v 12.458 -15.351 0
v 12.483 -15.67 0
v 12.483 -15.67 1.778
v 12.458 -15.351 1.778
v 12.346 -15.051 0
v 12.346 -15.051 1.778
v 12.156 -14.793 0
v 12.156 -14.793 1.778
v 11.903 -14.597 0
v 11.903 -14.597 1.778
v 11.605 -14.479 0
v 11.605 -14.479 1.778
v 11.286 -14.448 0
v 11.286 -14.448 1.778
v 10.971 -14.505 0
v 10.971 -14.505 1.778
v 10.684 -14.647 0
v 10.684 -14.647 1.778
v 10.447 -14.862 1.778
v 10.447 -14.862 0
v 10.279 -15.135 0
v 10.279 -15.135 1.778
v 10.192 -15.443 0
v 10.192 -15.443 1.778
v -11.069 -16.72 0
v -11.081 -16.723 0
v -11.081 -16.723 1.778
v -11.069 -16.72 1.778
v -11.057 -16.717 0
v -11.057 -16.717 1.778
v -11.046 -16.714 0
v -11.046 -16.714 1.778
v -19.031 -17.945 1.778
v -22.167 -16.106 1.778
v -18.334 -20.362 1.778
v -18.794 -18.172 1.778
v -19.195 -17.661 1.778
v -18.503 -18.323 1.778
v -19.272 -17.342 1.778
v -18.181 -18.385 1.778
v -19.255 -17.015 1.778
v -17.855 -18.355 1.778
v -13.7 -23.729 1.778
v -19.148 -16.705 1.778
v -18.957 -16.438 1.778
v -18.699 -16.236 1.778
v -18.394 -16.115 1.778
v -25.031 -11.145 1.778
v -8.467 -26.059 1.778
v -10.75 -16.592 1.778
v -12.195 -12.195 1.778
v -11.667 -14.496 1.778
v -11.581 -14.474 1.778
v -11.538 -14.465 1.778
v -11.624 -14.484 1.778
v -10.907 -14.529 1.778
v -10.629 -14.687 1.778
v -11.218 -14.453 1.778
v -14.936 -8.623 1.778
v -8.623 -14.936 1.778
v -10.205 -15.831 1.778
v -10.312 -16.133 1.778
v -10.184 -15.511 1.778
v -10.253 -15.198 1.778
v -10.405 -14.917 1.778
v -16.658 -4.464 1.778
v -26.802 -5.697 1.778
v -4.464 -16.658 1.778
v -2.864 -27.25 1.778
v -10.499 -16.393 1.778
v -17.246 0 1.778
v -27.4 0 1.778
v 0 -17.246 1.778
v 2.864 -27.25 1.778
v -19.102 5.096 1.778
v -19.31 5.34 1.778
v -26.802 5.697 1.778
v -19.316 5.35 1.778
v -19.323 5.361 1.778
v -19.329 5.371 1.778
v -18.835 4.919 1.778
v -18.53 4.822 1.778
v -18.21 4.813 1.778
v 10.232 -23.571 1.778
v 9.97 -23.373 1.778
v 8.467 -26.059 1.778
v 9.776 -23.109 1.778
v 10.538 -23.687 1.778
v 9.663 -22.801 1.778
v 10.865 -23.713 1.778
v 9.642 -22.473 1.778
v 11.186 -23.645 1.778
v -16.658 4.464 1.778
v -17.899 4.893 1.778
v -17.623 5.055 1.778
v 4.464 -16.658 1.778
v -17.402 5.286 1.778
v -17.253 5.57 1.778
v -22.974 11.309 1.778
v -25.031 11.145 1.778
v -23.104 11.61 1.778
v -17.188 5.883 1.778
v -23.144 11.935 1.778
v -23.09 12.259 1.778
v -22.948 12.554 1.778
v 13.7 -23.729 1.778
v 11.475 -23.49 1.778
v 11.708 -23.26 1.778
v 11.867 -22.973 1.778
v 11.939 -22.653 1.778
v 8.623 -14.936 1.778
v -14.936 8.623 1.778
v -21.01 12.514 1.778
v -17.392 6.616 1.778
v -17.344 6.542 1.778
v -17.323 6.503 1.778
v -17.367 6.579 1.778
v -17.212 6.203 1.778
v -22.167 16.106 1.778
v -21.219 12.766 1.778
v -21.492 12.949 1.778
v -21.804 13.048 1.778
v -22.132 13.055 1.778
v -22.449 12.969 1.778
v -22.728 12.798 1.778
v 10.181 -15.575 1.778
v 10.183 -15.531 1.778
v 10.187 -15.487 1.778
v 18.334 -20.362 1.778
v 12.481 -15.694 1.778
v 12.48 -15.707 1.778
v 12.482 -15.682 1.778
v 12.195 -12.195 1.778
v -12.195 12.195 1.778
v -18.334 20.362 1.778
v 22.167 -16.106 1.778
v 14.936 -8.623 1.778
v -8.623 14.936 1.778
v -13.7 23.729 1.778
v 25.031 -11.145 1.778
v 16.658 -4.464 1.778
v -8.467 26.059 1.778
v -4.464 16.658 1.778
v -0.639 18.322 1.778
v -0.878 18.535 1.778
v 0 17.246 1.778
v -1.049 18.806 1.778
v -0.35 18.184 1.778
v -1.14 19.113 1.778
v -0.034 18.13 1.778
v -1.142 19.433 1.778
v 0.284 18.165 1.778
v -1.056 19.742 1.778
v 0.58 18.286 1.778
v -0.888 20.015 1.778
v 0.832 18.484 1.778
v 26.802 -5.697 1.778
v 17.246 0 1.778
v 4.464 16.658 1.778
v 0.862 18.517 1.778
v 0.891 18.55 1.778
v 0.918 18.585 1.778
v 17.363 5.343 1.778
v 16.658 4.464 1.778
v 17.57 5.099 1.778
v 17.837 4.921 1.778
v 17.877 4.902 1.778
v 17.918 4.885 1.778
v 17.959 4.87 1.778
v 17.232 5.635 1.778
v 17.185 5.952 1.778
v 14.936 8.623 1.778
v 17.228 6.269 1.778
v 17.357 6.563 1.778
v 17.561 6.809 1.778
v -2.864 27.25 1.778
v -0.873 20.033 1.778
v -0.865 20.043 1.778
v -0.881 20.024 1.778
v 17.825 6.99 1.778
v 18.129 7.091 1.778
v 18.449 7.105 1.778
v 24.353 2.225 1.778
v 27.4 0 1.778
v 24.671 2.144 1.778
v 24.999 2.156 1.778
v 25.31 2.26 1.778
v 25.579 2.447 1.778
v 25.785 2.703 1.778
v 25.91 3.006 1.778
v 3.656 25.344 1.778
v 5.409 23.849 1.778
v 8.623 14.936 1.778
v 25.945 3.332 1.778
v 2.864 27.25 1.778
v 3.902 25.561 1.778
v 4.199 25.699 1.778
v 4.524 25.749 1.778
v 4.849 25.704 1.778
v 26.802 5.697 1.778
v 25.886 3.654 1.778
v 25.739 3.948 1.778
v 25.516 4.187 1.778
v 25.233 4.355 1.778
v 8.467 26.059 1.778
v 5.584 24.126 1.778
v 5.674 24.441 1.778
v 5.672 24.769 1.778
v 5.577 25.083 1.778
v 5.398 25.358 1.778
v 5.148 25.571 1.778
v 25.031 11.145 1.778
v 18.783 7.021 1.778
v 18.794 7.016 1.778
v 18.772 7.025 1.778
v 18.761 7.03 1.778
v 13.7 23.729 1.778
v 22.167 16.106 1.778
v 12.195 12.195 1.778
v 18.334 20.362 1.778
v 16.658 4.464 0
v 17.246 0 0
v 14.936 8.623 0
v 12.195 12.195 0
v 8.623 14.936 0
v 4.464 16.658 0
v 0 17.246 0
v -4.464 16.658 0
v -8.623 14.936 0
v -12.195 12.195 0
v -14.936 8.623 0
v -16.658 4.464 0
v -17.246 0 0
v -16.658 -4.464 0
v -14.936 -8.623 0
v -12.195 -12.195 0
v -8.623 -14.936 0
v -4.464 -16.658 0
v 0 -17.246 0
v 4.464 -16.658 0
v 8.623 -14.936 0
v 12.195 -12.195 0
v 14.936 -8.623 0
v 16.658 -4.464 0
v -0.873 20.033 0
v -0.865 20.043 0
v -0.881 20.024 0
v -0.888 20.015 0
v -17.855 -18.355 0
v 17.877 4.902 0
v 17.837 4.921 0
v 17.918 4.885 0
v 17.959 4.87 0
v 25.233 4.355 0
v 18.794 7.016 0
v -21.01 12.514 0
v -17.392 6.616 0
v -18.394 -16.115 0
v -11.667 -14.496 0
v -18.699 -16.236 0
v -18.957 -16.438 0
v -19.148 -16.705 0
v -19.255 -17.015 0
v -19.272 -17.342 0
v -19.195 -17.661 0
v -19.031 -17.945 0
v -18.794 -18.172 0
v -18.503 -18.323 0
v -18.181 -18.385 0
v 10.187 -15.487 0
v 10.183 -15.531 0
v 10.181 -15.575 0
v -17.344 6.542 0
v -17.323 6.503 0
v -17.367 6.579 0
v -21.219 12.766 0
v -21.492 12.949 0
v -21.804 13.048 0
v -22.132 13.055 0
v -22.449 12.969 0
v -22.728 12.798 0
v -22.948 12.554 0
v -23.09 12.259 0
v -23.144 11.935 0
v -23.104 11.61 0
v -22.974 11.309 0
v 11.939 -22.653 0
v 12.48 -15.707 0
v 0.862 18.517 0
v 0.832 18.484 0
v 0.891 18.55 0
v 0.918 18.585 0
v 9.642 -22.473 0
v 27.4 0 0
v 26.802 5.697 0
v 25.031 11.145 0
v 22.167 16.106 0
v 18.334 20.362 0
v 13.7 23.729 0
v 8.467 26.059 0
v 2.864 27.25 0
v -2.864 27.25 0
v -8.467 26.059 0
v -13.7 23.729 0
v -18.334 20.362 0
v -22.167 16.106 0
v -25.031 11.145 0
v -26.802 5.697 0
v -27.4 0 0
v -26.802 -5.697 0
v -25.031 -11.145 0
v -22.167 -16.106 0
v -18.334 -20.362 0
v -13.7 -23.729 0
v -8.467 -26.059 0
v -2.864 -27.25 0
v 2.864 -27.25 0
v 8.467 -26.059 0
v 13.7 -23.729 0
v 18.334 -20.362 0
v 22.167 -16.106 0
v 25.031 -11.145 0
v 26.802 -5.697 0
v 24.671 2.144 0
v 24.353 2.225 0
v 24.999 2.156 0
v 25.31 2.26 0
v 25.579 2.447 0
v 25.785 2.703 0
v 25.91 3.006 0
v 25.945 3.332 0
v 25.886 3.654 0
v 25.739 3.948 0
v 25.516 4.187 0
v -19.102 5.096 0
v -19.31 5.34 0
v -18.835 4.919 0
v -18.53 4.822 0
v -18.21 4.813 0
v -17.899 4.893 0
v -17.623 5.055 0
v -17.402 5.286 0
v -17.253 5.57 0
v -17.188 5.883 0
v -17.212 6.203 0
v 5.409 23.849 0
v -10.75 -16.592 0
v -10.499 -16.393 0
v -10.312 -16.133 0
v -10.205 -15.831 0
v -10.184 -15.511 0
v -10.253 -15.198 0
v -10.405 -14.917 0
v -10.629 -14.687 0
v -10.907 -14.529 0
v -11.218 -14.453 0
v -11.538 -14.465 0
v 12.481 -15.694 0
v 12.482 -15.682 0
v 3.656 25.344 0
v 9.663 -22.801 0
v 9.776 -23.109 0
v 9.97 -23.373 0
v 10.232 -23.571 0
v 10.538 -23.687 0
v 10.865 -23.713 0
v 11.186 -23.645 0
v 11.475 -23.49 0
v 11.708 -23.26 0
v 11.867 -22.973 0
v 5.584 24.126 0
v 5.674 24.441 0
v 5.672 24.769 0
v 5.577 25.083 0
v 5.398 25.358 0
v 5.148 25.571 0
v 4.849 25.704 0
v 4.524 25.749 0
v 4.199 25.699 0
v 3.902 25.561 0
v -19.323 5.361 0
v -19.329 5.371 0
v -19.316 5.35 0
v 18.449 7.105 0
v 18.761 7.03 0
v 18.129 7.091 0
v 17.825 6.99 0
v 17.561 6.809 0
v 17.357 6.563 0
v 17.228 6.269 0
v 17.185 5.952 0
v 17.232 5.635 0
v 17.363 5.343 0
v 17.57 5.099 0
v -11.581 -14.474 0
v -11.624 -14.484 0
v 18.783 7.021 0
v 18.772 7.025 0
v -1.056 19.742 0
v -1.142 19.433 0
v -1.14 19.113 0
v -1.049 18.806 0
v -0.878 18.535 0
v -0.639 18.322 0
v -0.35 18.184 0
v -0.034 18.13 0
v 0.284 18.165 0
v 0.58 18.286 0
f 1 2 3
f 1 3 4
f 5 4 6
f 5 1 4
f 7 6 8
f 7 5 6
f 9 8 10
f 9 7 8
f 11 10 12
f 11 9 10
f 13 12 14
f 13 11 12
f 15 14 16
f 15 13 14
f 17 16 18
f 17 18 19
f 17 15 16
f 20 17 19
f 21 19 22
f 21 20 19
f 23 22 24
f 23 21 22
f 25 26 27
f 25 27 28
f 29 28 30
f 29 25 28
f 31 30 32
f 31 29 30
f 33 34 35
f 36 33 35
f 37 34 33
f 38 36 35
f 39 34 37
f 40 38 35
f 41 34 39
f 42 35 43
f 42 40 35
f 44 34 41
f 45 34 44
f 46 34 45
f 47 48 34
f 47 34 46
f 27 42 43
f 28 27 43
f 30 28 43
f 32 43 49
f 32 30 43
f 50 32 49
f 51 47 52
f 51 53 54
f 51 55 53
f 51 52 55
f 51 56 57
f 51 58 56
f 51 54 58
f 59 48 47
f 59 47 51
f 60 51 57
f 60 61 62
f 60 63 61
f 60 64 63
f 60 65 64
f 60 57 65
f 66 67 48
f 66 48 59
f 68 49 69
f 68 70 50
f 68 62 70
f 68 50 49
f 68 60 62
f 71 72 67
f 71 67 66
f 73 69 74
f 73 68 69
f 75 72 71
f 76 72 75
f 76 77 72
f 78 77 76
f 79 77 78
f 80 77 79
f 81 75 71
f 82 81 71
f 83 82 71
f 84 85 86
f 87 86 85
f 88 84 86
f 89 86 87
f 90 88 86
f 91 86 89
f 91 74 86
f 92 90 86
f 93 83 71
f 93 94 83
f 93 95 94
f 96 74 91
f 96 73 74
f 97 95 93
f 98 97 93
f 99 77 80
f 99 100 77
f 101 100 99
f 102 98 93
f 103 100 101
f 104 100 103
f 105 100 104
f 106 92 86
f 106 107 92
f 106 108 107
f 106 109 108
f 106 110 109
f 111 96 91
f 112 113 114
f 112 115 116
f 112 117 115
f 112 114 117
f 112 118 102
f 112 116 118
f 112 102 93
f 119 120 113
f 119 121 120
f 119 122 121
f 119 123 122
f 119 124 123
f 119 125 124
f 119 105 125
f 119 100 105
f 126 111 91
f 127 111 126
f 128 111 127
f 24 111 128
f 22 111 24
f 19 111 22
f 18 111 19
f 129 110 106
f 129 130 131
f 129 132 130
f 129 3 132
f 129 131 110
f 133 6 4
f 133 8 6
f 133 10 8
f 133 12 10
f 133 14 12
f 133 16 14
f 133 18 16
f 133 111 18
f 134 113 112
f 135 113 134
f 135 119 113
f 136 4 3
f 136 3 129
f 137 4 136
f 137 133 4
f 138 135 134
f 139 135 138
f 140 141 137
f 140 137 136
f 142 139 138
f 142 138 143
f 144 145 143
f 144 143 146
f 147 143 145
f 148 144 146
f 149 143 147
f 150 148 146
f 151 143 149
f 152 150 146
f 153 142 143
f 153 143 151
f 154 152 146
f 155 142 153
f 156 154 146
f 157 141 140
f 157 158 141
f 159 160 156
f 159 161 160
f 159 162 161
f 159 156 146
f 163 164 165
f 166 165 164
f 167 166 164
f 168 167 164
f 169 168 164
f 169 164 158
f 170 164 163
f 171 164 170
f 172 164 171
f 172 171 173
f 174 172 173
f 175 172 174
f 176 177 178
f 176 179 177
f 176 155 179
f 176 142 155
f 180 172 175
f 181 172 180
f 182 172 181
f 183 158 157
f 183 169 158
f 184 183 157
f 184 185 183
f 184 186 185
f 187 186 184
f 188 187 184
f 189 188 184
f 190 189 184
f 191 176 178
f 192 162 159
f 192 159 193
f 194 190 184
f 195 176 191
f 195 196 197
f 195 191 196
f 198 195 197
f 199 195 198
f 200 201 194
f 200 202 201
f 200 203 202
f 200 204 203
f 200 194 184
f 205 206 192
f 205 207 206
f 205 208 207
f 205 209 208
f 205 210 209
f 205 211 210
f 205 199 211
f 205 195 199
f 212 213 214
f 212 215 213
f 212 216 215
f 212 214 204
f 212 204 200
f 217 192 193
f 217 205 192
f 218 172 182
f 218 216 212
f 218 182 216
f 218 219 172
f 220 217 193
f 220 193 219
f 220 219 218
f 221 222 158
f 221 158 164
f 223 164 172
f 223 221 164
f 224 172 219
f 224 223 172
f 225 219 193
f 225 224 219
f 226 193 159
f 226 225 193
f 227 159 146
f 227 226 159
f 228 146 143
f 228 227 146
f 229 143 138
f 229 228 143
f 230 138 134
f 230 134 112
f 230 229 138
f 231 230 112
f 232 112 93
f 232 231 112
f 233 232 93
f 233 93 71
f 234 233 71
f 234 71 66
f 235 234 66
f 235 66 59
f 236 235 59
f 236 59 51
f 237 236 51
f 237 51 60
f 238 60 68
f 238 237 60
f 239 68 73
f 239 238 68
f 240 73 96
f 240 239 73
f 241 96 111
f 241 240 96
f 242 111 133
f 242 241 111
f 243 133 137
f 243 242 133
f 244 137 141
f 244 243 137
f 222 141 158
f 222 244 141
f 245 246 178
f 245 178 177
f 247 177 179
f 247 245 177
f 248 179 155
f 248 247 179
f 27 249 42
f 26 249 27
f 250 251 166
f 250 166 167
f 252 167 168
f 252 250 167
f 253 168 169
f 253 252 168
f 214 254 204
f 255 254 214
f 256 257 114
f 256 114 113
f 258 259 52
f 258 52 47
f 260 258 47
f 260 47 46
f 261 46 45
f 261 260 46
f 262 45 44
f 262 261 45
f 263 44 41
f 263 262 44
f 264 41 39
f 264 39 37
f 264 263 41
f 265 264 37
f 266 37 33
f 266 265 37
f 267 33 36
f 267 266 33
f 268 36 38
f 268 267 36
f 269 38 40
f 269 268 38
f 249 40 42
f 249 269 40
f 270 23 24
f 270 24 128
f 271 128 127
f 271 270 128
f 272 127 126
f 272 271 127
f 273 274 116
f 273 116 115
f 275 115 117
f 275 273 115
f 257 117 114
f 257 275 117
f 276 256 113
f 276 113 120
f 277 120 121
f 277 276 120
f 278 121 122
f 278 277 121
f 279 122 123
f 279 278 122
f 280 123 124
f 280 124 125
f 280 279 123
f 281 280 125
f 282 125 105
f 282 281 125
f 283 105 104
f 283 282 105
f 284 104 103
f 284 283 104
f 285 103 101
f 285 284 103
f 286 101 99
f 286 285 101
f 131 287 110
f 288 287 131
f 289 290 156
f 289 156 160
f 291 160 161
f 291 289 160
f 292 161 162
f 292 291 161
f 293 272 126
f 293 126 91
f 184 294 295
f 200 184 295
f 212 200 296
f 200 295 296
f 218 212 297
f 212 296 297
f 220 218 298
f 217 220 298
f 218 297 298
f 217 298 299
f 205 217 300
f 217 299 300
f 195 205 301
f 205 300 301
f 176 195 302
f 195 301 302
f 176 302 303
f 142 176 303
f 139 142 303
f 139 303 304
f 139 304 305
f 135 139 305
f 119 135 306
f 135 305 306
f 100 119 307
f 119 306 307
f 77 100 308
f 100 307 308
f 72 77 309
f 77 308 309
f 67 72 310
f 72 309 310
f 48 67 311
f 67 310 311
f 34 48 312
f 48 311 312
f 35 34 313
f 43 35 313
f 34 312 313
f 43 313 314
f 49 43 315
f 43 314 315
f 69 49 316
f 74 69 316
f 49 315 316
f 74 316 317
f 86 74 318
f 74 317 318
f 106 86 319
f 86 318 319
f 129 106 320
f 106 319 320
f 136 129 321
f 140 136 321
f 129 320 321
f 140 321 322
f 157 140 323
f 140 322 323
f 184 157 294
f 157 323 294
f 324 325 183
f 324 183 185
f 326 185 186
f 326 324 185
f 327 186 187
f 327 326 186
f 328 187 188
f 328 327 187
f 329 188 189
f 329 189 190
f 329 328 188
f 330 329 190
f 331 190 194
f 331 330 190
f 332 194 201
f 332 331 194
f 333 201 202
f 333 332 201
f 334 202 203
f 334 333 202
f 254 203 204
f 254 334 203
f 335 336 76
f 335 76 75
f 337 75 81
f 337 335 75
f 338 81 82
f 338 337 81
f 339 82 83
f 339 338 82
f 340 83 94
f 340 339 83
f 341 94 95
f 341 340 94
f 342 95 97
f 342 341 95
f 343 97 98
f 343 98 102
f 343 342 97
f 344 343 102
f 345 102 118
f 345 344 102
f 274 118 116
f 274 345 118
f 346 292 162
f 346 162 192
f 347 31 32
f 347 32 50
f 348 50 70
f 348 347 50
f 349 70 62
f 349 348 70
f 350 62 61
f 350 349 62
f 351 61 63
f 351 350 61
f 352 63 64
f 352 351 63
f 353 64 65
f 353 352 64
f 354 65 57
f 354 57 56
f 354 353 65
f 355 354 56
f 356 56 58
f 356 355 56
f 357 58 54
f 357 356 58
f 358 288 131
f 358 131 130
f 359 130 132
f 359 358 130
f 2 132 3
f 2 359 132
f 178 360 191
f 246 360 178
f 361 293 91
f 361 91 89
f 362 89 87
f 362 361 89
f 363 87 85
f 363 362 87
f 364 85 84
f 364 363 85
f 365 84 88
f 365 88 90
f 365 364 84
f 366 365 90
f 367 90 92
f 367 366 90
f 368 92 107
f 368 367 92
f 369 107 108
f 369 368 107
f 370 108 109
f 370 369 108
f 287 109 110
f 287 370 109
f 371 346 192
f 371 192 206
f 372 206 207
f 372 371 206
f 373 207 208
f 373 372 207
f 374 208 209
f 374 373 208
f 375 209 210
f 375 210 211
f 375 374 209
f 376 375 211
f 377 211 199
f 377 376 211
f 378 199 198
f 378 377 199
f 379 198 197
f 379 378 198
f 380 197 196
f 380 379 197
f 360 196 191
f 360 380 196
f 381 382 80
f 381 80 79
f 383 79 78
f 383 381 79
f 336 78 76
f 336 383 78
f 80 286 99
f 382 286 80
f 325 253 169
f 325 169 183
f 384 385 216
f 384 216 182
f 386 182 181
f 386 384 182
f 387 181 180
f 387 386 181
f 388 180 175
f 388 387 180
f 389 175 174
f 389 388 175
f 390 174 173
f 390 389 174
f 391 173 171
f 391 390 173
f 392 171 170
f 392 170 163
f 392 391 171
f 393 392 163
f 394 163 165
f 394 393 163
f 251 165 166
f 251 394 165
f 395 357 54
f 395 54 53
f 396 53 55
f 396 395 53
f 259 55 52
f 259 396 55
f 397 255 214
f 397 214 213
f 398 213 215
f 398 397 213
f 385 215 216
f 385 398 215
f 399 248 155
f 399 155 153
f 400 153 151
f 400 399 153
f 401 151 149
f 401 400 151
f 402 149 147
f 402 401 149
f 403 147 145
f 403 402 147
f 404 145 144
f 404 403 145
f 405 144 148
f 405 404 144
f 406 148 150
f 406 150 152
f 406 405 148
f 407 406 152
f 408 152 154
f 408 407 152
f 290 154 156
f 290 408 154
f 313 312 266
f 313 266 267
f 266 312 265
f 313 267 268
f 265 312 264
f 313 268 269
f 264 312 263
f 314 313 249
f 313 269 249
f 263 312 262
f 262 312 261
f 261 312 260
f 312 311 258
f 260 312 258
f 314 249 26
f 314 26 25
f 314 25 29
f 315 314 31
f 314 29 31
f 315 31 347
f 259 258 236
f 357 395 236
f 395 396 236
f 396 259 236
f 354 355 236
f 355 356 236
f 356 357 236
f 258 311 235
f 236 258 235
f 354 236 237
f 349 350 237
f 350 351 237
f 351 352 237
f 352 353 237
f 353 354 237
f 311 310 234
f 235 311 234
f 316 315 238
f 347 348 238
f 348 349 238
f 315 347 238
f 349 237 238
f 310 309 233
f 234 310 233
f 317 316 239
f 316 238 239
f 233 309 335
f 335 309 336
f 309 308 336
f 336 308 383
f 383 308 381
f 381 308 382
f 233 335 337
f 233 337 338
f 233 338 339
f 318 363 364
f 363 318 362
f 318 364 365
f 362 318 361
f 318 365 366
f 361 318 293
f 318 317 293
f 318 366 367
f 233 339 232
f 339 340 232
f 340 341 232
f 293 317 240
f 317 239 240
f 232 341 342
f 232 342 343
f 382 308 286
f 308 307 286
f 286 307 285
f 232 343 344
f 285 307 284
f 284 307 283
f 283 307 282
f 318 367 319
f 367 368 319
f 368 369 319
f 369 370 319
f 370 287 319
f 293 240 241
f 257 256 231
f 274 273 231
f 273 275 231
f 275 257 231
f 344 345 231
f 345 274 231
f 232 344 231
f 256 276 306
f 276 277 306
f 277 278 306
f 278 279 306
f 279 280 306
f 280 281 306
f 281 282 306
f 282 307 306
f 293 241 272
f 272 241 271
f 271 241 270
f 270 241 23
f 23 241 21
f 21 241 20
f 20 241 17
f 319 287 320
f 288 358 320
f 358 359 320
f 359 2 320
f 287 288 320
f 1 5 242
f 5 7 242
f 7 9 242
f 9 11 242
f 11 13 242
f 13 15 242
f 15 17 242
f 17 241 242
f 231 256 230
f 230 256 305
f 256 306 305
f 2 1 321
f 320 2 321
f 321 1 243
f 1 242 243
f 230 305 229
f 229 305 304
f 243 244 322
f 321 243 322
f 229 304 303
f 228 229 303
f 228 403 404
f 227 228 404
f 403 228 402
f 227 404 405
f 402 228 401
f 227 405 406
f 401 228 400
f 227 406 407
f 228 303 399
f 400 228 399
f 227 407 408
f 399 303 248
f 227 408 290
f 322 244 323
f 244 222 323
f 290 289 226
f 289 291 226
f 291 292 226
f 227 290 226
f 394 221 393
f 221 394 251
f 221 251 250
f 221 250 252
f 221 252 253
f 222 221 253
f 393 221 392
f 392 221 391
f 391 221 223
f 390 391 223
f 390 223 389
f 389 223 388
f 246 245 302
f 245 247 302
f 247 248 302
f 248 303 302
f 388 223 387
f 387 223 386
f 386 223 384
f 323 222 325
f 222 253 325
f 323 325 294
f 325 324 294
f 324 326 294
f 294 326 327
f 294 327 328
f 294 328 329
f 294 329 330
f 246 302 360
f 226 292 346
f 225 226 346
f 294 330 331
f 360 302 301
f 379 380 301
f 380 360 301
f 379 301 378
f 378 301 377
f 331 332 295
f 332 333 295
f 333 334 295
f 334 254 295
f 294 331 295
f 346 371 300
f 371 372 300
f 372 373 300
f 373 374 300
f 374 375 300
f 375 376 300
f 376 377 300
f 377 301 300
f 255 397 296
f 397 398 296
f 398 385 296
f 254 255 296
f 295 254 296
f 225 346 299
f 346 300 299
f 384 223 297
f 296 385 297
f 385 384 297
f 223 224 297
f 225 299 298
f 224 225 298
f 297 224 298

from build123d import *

# Parameters (mm, degrees)
F0_R     = 27.400357
F2_DEPTH = 1.778
F1_R     = 17.246114
F3_DEPTH = 1.778
F6_DEPTH = 1.778
F7_COUNT = 5


with BuildPart() as f2:
    # F0 (on Top) → F2 (new body)
    with BuildSketch(Plane.XY):
        Circle(F0_R)
    extrude(amount=F2_DEPTH)

    # F1 (on Top) → F3 (cut, through all)
    with BuildSketch(Plane.XY):
        Circle(F1_R)
    extrude(amount=F3_DEPTH, mode=Mode.SUBTRACT)


with BuildPart() as f6:
    # F5 (on Top) → F6 (new body, through all)
    with BuildSketch(Plane.XY):
        with BuildLine():
            Line((-0.888398, 20.0147), (-0.864621, 20.042582))
            ThreePointArc((-0.864621, 20.042582), (-0.87662, 20.028736), (-0.888398, 20.0147))
        make_face()
        with BuildLine():
            Line((3.656133, 25.34403), (-0.864621, 20.042582))
            Line((-0.864621, 20.042582), (-0.888398, 20.0147))
            ThreePointArc((-0.888398, 20.0147), (-0.765731, 18.420441), (0.831965, 18.484277))
            Line((0.831965, 18.484277), (0.917938, 18.585037))
            Line((0.917938, 18.585037), (5.409154, 23.848715))
            ThreePointArc((5.409154, 23.848715), (5.280411, 25.473012), (3.656133, 25.34403))
        make_face()
        with BuildLine():
            Line((0.917938, 18.585037), (0.831965, 18.484277))
            ThreePointArc((0.831965, 18.484277), (0.876401, 18.53342), (0.917938, 18.585037))
        make_face()
    extrude(amount=F6_DEPTH)


with BuildPart() as f7_1:
    # F7: instance of F6
    add(f6.part.rotate(Axis((0, 0, 1.187779), (0, 0, -1)), 1 * 360 / F7_COUNT))


with BuildPart() as f7_2:
    # F7: instance of F6
    add(f6.part.rotate(Axis((0, 0, 1.187779), (0, 0, -1)), 2 * 360 / F7_COUNT))


with BuildPart() as f7_3:
    # F7: instance of F6
    add(f6.part.rotate(Axis((0, 0, 1.187779), (0, 0, -1)), 3 * 360 / F7_COUNT))


with BuildPart() as f7_4:
    # F7: instance of F6
    add(f6.part.rotate(Axis((0, 0, 1.187779), (0, 0, -1)), 4 * 360 / F7_COUNT))


with BuildPart() as f2_1:
    add(f2.part)

    # F8: cut F6, F7_1, F7_2, F7_3, F7_4
    add(f6.part, mode=Mode.SUBTRACT)
    add(f7_1.part, mode=Mode.SUBTRACT)
    add(f7_2.part, mode=Mode.SUBTRACT)
    add(f7_3.part, mode=Mode.SUBTRACT)
    add(f7_4.part, mode=Mode.SUBTRACT)


solid = f2_1.part
